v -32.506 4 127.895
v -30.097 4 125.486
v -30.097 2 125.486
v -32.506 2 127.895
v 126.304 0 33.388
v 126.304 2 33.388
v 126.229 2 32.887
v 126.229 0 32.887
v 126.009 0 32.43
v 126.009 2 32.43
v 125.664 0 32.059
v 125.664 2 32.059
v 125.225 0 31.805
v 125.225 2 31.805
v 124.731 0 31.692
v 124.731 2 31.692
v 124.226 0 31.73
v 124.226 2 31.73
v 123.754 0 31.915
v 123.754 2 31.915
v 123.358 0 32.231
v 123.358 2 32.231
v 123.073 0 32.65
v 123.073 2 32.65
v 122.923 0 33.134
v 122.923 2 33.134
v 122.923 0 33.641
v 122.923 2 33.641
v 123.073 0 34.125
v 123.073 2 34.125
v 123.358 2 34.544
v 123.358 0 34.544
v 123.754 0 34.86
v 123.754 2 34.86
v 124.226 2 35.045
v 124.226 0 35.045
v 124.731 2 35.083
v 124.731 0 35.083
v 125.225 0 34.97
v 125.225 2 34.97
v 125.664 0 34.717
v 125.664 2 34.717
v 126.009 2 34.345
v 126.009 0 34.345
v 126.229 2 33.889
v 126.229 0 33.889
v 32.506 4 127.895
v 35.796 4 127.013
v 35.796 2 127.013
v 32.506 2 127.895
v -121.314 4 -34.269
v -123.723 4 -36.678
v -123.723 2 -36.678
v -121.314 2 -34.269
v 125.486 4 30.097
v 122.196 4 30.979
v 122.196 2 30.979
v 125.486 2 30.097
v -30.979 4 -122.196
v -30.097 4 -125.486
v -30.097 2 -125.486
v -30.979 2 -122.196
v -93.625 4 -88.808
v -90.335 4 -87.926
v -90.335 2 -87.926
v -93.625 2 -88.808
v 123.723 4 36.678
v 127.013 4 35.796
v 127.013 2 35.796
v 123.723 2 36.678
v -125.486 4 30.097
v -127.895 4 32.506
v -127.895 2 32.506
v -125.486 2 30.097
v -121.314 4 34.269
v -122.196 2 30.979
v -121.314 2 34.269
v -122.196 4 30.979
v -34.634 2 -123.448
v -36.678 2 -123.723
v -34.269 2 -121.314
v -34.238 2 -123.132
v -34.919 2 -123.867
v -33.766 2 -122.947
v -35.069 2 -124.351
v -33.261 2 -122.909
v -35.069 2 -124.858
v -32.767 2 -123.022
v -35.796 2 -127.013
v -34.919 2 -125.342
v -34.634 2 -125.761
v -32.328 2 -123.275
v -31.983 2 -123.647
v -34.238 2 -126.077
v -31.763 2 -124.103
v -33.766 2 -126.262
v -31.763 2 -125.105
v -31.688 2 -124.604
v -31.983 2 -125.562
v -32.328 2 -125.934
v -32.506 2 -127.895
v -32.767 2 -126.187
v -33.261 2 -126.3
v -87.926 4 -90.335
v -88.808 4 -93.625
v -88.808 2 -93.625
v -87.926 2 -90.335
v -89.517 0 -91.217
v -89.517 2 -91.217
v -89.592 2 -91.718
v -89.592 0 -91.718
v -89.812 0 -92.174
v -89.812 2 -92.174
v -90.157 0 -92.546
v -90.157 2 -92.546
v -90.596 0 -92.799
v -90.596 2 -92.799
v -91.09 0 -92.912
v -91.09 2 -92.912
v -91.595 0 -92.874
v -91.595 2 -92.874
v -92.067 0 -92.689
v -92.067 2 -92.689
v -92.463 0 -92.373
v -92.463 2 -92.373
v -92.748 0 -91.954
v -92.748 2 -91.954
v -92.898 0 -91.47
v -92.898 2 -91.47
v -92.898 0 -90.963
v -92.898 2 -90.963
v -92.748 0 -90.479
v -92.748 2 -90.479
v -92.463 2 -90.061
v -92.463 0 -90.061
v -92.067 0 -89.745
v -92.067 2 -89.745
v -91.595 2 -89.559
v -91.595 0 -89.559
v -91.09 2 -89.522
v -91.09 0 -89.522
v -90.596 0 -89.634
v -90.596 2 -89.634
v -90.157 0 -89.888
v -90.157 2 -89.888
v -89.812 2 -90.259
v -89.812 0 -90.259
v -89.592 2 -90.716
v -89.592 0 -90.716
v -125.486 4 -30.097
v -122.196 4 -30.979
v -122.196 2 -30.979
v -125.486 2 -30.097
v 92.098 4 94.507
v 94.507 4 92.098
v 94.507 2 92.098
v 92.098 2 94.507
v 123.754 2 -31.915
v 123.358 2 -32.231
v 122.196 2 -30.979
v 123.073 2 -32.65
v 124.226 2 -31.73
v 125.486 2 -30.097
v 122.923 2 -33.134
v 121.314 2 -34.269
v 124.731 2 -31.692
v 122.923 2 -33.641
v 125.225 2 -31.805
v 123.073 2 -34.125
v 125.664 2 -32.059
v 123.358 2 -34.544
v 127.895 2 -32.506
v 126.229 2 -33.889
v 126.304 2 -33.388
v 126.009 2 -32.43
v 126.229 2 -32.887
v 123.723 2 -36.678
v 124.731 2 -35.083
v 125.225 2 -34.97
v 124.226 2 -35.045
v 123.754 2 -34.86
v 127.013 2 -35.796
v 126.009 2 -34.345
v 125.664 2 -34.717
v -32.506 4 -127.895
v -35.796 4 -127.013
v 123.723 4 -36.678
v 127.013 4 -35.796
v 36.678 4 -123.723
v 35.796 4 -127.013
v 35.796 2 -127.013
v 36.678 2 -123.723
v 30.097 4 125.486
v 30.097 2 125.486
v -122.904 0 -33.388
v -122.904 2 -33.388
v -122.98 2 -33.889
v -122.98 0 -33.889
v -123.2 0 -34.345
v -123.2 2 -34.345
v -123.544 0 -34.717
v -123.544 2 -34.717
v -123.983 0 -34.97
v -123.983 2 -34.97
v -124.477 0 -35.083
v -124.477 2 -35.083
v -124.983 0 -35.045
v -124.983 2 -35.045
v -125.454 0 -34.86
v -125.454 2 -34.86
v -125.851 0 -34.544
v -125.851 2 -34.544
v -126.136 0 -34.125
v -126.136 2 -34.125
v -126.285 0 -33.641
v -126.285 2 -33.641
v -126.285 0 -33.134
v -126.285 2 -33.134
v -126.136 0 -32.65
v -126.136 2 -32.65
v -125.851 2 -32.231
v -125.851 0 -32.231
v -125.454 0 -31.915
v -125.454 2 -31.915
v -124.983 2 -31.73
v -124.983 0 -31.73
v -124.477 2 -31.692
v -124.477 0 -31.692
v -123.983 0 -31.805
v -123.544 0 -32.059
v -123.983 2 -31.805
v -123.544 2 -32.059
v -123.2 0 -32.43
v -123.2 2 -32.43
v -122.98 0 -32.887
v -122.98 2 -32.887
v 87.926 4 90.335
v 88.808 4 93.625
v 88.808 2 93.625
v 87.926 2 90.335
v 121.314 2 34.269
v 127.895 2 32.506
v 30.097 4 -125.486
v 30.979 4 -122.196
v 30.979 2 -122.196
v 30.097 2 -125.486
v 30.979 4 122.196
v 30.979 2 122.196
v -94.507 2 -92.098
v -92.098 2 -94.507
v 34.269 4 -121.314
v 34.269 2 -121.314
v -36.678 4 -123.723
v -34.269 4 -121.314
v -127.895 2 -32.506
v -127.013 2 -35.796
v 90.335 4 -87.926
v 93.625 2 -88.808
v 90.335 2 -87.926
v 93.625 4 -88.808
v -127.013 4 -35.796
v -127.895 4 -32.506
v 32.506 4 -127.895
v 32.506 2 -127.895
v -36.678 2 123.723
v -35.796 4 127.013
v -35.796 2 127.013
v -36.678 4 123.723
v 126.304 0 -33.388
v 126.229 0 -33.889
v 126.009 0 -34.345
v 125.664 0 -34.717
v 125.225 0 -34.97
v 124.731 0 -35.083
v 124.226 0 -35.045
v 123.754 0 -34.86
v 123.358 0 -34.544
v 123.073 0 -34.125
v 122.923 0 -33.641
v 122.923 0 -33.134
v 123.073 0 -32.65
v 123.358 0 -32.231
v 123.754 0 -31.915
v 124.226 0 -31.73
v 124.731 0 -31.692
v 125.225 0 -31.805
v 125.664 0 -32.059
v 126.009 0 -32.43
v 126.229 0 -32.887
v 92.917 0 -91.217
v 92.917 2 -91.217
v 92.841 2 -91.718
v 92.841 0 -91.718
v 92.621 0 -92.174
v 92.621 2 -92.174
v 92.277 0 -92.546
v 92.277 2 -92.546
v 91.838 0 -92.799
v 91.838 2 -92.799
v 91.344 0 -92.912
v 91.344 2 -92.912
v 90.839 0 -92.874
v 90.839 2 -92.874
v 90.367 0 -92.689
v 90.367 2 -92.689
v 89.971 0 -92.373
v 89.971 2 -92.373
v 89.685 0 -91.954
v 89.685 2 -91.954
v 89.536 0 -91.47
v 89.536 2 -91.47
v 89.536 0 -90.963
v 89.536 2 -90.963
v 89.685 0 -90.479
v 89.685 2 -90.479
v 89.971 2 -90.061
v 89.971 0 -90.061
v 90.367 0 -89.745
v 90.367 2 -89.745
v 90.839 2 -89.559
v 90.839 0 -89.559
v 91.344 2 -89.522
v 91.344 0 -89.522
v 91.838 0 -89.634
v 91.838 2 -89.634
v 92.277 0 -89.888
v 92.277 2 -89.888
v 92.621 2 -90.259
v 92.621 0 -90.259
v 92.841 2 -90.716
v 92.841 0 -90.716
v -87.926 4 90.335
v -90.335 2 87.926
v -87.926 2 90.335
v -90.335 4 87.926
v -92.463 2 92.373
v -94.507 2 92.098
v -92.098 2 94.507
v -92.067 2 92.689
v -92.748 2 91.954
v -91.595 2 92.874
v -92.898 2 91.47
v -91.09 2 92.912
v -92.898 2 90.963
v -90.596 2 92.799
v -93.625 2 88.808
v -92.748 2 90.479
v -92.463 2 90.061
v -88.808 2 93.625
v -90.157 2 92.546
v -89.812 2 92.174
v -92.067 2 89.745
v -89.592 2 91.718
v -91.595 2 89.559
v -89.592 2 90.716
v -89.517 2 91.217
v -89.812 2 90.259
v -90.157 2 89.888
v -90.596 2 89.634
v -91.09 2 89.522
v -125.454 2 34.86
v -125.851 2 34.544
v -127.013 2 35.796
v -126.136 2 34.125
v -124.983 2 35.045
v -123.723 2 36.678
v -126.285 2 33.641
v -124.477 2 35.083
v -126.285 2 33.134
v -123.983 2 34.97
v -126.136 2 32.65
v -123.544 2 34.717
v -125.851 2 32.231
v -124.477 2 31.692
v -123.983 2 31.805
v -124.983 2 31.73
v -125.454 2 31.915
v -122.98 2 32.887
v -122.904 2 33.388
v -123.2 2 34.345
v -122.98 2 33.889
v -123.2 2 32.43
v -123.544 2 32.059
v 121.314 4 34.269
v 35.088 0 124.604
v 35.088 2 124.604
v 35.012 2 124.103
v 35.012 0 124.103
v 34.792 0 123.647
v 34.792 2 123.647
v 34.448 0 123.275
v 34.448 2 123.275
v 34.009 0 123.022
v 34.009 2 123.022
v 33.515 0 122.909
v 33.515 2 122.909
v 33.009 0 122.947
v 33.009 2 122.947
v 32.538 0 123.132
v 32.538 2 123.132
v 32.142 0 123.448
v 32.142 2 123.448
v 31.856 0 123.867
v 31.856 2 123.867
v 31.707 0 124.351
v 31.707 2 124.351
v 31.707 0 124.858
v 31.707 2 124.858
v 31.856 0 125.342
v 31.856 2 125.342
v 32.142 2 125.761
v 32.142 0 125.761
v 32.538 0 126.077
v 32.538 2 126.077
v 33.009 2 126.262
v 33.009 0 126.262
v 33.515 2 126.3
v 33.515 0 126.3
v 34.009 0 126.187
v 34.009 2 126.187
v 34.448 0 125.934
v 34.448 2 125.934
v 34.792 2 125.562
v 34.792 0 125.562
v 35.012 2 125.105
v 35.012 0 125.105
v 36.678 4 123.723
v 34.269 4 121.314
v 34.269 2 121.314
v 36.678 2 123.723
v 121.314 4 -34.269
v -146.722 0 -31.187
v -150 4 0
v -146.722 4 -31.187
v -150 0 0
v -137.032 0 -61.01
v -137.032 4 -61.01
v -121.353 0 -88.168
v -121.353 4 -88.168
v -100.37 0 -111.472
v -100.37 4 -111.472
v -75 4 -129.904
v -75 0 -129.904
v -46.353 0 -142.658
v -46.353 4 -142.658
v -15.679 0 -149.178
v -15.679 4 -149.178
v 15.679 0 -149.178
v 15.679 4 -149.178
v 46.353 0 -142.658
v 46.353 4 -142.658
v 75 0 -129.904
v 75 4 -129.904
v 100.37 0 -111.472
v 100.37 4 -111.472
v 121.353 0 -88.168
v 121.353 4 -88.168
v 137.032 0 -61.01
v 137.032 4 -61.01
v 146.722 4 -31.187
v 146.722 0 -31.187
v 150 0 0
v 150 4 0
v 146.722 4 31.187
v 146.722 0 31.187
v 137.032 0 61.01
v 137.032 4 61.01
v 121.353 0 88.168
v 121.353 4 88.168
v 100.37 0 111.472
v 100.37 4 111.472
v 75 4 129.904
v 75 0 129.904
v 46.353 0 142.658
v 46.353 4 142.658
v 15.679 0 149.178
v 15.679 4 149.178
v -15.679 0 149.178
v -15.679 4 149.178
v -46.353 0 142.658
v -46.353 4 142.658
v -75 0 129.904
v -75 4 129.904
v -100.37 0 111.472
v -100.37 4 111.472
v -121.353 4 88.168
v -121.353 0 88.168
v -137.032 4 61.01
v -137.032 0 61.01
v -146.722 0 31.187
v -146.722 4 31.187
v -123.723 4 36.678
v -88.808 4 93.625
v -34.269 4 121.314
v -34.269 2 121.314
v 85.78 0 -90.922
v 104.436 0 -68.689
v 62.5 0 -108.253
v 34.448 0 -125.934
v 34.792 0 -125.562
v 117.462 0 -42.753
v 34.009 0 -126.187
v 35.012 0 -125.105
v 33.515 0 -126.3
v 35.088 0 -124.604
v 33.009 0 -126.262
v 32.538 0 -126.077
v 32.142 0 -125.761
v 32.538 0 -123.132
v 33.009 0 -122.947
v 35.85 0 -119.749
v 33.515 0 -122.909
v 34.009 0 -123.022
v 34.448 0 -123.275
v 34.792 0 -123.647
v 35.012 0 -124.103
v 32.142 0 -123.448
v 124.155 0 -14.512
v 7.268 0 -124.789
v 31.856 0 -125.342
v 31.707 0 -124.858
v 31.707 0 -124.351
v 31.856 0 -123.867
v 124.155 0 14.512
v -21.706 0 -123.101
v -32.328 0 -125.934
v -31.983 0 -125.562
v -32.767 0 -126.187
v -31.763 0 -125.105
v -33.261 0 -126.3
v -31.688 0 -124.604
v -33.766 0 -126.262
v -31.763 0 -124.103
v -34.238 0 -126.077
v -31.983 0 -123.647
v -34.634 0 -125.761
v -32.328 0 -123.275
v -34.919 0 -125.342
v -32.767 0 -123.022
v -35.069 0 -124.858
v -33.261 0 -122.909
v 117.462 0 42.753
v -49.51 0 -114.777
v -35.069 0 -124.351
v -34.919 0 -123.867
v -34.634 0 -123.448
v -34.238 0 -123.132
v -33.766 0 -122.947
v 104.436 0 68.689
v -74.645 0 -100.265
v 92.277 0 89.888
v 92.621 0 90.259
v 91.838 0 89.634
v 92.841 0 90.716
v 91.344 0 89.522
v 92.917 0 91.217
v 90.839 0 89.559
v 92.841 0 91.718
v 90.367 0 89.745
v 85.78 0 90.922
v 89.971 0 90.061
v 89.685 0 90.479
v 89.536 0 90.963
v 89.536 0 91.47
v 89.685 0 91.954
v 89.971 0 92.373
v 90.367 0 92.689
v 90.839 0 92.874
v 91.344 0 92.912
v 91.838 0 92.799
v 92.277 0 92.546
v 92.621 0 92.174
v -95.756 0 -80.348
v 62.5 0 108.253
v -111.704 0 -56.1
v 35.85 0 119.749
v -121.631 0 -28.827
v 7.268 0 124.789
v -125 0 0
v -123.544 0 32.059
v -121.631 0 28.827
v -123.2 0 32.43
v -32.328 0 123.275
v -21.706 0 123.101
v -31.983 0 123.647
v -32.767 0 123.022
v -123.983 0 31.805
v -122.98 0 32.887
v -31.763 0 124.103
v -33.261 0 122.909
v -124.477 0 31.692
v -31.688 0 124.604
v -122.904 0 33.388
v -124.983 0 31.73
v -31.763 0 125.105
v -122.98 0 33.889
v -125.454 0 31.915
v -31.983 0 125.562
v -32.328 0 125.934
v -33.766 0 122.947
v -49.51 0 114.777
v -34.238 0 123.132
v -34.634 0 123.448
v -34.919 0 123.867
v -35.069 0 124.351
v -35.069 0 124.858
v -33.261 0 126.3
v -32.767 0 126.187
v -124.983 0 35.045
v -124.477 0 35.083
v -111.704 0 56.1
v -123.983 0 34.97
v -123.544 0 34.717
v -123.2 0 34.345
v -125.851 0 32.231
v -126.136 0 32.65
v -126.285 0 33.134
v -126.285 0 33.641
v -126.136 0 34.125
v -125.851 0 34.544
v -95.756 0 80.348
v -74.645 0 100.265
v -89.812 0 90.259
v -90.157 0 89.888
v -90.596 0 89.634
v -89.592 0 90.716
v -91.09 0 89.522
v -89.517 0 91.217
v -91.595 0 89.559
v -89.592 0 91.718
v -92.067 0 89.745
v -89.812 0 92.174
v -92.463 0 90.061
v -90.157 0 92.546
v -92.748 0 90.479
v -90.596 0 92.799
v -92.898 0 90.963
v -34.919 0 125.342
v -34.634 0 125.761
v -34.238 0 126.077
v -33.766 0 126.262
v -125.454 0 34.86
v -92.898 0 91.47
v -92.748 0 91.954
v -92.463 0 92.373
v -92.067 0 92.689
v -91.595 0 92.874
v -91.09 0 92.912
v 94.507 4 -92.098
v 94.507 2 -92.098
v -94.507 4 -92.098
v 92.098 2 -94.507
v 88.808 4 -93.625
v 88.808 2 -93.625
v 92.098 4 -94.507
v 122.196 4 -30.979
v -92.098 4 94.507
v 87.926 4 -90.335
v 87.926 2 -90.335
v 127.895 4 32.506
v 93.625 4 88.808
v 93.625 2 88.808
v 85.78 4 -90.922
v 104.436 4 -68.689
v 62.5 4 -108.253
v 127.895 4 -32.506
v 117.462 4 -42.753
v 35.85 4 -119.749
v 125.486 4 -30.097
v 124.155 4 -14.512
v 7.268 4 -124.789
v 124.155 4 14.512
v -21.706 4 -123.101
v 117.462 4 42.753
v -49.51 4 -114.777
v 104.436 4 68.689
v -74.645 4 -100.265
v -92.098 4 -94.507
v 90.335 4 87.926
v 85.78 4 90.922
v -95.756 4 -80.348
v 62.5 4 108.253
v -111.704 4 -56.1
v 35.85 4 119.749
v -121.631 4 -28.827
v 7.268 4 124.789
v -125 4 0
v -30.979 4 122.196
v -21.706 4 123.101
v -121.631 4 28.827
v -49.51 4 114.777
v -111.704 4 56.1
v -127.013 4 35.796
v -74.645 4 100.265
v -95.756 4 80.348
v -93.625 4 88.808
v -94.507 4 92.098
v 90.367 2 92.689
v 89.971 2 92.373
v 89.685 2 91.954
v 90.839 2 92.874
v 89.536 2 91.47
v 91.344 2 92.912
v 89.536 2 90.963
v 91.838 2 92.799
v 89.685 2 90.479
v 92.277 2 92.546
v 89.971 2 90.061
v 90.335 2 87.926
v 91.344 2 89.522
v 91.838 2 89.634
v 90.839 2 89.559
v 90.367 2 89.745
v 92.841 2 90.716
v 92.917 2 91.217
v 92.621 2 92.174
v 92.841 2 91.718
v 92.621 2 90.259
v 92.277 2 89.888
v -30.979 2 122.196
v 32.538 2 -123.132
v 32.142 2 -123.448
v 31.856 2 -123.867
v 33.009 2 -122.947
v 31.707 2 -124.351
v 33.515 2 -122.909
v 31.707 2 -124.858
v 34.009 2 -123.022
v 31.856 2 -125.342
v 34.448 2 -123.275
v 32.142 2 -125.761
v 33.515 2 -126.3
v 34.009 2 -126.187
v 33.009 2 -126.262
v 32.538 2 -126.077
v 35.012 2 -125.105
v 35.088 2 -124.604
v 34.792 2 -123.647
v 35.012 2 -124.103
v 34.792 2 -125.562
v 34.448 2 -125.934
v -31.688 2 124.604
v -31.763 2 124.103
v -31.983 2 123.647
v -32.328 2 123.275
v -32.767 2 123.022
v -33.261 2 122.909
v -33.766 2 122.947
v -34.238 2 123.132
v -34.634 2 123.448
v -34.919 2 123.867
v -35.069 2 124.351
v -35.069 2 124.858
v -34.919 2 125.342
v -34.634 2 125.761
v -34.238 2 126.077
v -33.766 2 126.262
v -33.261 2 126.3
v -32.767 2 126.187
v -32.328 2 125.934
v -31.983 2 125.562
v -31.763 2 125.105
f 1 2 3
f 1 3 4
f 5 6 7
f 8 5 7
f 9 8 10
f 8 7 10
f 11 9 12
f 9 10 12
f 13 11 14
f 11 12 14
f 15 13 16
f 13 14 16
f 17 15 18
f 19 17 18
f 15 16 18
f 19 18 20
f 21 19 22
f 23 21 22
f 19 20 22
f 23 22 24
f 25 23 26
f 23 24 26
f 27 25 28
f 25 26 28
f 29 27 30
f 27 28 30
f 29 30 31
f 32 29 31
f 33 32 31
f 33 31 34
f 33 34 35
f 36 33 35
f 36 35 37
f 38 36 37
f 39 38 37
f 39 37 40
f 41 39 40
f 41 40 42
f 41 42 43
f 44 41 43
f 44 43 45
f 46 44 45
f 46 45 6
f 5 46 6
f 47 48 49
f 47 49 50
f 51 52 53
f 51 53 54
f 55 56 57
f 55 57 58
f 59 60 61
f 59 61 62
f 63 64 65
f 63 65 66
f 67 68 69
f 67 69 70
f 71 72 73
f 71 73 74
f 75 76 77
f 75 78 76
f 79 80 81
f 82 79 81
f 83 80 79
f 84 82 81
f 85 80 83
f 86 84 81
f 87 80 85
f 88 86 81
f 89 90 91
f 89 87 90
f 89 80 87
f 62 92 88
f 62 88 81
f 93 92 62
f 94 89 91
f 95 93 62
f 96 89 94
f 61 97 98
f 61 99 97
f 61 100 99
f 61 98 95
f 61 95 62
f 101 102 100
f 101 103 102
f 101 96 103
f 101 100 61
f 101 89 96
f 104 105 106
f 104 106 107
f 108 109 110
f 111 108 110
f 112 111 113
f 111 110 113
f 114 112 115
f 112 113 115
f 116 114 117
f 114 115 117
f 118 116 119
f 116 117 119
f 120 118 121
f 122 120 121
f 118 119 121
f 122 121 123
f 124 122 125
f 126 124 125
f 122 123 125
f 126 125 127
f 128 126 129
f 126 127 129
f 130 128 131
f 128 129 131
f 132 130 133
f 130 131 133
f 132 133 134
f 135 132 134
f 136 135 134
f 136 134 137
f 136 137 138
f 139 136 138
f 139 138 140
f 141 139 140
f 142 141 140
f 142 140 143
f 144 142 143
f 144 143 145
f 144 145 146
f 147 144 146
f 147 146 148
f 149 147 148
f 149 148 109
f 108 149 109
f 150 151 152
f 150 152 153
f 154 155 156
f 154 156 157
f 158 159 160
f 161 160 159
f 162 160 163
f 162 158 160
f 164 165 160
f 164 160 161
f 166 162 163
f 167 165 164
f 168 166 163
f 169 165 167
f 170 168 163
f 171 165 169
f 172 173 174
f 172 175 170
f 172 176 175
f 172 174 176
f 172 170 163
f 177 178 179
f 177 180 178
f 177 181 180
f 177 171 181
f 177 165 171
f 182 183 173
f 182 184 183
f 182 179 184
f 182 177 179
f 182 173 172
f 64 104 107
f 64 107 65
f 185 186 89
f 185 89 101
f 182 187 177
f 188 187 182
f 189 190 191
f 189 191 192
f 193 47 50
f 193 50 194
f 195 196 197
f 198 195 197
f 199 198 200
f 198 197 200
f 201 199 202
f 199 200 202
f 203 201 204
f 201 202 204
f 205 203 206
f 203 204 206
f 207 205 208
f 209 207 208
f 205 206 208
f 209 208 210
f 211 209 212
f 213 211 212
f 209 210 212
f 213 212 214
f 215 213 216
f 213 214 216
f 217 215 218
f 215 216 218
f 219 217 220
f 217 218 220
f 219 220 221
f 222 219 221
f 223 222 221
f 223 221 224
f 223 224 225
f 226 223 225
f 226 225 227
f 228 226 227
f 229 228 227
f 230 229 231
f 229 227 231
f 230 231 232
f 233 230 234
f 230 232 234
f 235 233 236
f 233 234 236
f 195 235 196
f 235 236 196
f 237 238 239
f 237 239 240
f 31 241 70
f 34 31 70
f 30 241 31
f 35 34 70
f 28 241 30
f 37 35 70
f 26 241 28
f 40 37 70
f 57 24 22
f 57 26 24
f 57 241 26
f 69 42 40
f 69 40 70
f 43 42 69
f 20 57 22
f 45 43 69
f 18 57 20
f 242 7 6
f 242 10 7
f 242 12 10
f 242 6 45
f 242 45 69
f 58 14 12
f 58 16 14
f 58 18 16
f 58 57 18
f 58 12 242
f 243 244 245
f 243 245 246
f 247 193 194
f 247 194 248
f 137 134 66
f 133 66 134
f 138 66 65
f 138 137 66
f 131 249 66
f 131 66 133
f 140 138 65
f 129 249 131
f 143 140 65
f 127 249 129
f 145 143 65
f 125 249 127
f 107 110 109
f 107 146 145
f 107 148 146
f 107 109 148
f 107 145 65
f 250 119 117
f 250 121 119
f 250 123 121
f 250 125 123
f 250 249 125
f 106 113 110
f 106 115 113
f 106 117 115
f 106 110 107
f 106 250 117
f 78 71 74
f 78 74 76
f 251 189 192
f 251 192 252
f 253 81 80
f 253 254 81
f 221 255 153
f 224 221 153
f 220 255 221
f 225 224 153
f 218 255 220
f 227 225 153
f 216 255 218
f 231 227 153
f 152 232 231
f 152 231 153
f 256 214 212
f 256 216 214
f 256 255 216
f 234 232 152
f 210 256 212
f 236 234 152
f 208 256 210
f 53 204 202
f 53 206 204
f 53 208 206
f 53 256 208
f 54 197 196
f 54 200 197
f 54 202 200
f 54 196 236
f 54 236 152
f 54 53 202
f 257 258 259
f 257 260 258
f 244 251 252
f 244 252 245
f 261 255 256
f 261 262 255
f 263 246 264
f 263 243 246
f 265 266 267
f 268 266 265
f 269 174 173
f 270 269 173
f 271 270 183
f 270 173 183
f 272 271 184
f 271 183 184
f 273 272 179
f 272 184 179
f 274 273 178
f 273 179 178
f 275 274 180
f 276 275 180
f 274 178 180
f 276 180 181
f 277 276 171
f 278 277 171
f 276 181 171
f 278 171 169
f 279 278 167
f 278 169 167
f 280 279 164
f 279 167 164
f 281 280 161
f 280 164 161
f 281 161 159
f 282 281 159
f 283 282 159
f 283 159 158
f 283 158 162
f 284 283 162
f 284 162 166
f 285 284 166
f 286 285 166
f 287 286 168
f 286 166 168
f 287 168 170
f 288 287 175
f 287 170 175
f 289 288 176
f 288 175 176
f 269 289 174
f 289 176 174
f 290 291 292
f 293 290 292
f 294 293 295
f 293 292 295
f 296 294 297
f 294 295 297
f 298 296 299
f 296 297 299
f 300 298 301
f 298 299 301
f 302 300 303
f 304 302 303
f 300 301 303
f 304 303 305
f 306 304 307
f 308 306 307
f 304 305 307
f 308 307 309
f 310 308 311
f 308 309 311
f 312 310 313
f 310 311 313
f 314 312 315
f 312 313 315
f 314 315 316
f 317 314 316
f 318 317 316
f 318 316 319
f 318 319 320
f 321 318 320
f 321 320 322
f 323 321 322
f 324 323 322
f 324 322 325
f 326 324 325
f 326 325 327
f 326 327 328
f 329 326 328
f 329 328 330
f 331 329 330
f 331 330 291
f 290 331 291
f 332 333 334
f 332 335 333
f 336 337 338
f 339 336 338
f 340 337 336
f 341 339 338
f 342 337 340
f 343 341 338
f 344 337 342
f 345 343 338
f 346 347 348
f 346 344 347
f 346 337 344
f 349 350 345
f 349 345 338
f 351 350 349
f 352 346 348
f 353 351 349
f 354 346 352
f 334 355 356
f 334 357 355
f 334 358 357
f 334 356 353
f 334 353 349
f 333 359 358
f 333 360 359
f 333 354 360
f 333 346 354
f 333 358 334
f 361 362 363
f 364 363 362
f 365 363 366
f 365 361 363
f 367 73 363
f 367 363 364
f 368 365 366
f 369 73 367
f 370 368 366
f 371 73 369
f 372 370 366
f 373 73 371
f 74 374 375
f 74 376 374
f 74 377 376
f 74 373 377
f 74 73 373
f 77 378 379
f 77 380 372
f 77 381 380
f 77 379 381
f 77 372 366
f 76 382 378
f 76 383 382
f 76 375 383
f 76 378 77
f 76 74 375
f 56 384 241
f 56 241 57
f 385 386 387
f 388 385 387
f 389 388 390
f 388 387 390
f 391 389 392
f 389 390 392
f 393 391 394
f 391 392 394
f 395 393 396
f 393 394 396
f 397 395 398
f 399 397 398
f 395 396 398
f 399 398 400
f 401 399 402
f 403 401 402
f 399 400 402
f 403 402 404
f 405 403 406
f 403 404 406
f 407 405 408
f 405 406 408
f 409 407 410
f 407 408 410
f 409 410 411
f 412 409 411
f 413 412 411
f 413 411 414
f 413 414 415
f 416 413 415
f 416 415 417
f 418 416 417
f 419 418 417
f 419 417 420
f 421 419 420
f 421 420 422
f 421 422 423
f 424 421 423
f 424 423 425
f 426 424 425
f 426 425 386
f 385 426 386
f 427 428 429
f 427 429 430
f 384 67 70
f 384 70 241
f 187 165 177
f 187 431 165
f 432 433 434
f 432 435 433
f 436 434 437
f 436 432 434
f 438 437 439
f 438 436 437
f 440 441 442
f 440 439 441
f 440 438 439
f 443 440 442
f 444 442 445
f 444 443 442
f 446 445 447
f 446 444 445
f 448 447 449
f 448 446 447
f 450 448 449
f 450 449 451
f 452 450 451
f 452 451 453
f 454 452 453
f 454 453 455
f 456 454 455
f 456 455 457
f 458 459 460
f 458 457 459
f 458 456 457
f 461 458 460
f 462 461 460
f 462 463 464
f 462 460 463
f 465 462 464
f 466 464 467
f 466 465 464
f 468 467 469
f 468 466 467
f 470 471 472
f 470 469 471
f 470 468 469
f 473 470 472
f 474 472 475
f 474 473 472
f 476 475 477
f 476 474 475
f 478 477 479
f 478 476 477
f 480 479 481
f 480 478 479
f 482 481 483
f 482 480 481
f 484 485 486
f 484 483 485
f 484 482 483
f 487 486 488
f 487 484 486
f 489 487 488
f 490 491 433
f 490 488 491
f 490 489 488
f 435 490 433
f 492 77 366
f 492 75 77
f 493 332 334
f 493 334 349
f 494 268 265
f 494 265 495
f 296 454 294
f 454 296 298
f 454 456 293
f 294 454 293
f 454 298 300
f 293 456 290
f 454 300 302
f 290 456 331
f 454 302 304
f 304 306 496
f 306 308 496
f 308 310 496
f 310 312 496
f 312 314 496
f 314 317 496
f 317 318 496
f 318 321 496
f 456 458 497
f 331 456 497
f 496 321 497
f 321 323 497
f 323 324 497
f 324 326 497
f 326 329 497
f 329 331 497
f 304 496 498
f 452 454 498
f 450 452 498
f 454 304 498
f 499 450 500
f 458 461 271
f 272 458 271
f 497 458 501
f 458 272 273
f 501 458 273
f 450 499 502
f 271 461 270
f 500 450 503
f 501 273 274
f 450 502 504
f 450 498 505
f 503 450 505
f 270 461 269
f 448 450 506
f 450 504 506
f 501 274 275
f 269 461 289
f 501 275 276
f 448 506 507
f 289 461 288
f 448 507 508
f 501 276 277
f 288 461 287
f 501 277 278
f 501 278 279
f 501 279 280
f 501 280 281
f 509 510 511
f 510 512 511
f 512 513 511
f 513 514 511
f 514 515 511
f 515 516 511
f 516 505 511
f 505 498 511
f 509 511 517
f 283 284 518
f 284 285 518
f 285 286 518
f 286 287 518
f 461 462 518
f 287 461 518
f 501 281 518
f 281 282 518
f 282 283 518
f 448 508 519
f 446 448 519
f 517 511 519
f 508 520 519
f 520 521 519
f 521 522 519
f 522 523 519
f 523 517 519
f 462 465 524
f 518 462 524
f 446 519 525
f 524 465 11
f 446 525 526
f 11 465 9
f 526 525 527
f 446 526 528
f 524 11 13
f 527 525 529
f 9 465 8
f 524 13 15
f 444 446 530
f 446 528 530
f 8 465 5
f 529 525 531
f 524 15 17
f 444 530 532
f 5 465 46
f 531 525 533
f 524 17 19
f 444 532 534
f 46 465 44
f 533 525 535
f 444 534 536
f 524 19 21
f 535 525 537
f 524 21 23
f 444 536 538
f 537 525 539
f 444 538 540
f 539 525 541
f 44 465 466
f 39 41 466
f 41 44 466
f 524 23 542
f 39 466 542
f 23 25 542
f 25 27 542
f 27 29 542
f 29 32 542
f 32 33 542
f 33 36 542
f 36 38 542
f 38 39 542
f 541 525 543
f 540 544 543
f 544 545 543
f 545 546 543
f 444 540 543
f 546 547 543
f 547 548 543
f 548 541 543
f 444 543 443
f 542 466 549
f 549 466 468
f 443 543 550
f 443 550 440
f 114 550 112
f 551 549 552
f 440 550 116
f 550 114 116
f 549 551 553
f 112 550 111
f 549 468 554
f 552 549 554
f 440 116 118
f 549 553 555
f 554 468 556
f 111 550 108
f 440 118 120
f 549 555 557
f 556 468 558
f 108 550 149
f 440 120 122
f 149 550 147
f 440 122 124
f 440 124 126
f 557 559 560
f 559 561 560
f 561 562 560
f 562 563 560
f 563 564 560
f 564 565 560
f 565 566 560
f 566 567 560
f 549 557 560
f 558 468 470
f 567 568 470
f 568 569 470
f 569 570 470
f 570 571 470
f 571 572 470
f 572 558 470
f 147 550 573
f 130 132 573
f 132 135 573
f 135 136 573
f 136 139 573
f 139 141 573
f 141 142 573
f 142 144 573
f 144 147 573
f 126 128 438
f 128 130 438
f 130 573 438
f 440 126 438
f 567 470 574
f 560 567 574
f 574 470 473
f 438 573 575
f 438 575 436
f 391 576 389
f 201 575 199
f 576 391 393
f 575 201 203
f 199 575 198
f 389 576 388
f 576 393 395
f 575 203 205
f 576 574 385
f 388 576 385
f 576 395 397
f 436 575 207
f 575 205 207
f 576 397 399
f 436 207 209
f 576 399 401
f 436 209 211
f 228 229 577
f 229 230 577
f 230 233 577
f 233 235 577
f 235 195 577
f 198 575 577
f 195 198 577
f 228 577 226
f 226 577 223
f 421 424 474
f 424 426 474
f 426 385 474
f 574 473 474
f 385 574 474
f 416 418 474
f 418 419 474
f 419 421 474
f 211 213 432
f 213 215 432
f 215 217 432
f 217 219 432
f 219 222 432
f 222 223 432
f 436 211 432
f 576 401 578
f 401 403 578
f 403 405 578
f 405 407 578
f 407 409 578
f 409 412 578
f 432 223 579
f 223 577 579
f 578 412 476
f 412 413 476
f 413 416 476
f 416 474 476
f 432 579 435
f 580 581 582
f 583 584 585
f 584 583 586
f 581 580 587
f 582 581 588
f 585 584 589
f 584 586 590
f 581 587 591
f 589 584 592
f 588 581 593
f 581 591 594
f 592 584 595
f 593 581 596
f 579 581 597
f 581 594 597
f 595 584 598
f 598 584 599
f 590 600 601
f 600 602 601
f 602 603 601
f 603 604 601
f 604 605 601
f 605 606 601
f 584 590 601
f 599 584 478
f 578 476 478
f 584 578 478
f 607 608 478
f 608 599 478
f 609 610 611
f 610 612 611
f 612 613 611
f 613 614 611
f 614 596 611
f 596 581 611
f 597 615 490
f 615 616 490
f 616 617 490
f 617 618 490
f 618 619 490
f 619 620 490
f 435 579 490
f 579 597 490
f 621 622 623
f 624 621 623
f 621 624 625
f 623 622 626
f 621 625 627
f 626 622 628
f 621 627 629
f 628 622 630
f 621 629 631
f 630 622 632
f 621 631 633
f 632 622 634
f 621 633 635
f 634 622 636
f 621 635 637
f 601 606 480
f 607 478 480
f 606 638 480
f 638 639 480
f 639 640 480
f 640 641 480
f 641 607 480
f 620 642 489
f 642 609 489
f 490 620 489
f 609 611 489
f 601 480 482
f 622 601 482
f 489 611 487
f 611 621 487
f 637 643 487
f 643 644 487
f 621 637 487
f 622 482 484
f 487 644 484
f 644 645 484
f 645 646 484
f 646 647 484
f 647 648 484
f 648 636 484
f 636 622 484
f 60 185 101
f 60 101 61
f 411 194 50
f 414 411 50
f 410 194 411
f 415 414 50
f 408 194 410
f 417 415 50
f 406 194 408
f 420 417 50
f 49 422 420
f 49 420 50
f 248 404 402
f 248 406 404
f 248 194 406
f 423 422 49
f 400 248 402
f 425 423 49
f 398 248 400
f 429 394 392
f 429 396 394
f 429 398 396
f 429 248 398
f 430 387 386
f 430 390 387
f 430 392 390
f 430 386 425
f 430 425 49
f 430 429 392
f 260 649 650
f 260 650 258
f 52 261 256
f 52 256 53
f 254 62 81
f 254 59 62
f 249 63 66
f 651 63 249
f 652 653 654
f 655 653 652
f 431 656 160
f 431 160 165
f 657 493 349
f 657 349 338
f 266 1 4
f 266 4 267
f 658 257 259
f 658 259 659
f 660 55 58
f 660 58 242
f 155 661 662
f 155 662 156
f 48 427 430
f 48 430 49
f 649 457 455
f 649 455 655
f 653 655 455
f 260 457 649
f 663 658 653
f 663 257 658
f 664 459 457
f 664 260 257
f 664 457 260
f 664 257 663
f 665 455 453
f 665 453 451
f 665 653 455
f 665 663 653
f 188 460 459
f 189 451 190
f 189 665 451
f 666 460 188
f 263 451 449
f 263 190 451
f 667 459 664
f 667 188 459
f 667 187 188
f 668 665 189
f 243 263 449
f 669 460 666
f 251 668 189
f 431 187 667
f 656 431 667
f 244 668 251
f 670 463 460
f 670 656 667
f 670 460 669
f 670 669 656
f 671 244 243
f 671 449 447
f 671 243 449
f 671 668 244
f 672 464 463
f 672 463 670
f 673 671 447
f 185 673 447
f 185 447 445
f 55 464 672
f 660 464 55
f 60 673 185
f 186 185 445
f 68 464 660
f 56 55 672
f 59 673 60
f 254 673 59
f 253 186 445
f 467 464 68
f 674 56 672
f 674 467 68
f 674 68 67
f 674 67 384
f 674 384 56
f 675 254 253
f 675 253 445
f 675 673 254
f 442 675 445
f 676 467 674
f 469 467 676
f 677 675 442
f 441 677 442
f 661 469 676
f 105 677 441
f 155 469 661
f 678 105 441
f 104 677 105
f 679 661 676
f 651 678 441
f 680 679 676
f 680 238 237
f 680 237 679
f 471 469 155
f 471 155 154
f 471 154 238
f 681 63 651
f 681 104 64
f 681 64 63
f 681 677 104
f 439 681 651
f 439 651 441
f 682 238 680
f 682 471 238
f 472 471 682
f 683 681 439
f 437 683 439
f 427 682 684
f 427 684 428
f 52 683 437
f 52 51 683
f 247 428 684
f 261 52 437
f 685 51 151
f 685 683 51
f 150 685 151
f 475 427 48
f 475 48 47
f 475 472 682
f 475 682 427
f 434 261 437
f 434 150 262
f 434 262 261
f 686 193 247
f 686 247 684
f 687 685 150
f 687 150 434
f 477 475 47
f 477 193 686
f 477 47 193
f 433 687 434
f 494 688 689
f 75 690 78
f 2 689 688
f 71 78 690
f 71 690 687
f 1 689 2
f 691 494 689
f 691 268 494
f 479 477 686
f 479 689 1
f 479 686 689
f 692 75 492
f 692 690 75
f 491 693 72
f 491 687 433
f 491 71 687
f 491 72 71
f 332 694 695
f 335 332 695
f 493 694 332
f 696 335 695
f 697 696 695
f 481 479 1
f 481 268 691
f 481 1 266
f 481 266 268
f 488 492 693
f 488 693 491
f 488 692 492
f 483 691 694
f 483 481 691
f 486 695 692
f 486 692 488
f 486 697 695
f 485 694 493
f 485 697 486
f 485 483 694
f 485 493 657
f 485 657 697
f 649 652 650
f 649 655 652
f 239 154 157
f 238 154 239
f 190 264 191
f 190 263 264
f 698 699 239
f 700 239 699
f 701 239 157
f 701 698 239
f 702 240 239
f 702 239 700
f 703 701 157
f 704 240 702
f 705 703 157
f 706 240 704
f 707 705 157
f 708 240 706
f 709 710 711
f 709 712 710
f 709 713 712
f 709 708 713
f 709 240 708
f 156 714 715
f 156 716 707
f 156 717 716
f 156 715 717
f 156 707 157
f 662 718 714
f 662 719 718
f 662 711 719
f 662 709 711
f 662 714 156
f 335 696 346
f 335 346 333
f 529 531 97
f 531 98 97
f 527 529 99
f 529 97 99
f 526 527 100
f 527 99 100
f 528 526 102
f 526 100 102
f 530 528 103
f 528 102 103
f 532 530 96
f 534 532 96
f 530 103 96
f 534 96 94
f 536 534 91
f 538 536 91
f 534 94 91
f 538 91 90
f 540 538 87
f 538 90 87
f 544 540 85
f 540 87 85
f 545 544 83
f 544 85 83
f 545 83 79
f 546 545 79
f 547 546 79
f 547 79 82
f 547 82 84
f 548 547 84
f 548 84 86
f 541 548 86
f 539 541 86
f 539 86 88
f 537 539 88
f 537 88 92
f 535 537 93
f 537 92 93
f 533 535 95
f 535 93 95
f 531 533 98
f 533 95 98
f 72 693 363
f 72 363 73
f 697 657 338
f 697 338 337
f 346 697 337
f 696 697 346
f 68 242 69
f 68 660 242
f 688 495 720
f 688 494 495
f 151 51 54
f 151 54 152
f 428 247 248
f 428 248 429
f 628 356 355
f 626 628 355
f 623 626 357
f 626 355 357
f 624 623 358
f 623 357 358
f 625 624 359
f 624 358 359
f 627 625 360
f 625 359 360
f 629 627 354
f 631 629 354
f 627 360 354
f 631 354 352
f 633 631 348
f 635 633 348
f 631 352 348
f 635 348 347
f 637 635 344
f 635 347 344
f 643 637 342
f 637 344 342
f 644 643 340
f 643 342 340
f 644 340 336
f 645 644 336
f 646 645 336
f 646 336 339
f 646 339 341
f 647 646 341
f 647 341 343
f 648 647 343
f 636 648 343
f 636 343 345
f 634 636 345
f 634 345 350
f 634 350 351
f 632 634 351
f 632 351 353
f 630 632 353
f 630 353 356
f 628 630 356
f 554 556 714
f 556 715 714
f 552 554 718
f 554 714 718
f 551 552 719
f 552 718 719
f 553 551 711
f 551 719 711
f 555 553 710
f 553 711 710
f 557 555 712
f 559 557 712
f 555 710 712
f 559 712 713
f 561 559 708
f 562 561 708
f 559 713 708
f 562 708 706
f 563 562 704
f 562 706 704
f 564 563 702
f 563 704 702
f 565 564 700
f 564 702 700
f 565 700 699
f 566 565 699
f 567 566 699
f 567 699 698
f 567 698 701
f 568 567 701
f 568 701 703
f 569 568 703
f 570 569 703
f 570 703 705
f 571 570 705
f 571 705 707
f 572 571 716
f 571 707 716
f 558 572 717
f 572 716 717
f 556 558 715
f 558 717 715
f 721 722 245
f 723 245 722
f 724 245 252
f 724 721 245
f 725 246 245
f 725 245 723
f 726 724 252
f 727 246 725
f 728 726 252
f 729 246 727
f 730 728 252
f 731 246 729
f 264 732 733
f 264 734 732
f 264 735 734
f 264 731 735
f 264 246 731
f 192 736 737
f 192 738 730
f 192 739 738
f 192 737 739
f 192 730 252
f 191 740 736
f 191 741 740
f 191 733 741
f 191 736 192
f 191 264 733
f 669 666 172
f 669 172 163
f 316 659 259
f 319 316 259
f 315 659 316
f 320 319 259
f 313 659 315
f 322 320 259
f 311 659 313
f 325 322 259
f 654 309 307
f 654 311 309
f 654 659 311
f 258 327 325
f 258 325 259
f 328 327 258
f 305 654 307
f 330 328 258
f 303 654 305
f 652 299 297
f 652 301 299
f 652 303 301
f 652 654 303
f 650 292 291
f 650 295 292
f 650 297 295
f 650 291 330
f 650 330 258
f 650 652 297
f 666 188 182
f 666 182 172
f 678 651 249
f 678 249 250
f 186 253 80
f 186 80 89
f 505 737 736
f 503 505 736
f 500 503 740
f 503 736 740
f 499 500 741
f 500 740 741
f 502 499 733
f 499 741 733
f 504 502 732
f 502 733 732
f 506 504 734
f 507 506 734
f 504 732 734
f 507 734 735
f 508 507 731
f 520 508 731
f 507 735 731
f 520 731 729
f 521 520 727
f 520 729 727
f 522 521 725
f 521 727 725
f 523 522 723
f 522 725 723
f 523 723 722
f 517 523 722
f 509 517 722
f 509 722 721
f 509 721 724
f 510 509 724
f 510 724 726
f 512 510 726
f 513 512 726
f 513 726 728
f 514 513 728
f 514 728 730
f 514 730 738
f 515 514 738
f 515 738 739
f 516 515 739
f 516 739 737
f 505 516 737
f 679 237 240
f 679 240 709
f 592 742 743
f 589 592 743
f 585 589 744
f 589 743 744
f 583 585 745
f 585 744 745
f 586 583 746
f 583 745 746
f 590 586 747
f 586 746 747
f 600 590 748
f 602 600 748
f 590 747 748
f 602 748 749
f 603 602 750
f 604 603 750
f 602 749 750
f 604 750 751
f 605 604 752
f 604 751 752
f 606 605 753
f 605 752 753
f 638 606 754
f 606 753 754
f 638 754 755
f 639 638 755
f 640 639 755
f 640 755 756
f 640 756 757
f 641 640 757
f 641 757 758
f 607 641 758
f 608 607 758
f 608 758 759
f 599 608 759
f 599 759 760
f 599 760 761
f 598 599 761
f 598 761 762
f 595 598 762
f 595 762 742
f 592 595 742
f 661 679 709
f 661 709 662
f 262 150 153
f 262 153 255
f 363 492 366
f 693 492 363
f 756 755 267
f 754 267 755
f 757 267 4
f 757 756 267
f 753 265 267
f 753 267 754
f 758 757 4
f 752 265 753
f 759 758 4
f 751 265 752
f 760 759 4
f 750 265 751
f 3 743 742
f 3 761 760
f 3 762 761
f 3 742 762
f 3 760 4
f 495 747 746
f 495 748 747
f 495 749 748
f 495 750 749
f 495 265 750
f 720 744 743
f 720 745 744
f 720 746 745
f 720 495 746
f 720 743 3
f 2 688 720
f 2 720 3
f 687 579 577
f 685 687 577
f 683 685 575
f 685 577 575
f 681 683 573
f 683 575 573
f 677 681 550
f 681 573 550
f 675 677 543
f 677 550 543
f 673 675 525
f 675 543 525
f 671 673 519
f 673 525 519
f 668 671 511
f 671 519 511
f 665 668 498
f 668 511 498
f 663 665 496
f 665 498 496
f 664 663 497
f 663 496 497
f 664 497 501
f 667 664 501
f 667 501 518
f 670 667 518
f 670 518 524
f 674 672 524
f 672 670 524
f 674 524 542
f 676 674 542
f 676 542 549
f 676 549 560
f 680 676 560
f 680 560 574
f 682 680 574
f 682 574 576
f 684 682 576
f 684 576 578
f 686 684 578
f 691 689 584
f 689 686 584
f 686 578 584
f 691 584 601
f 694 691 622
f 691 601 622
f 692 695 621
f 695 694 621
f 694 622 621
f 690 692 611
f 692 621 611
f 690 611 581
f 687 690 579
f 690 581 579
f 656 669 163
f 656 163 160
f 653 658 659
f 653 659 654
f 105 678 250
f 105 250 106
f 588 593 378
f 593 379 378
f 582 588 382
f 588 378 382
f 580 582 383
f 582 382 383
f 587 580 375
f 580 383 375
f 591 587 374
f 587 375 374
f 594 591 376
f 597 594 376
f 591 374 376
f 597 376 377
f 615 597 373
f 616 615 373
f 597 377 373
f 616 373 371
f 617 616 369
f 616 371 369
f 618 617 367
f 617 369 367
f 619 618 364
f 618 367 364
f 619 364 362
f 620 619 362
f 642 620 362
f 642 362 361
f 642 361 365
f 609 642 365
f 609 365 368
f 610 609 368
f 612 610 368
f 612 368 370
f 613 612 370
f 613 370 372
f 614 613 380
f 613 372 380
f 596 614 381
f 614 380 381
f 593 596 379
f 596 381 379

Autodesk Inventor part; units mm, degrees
ref_plane "YZ Plane" through (0, 0, 0) normal (1, 0, 0) x (0, 1, 0)
ref_plane "XZ Plane" through (0, 0, 0) normal (0, 1, 0) x (-1, 0, 0)
ref_plane "XY Plane" through (0, 0, 0) normal (0, 0, 1) x (1, 0, 0)
sketch "Sketch1" plane through (0, 0, 0) normal (0, 1, 0) x (-1, 0, 0)
  circle A0 centre (0, 0) radius 150
  circle A1 centre (0, 0) radius 125
  dimension "d0" = 300
  dimension "d1" = 250
extrude "Extrusion1" add sketch "Sketch1" along normal blind 4
sketch "Sketch2" plane through (0, 4, 0) normal (0, 1, 0) x (1, 0, 0)
  line L0 (0, 0) -> (124.6044, 33.3877) construction
  line L1 (125.4861, 30.0974) -> (122.1958, 30.979)
  line L2 (122.1958, 30.979) -> (121.3141, 34.2693)
  line L3 (121.3141, 34.2693) -> (123.7228, 36.678)
  line L4 (123.7228, 36.678) -> (127.0131, 35.7963)
  line L5 (127.0131, 35.7963) -> (127.8947, 32.506)
  line L6 (127.8947, 32.506) -> (125.4861, 30.0974)
  line L7 (0, 0) -> (150, 0) construction
  circle A0 centre (0, 0) radius 150 projected
  line L8 (87.9265, 90.3351) -> (88.8081, 93.6254)
  line L9 (90.3351, 87.9265) -> (87.9265, 90.3351)
  line L10 (93.6254, 88.8081) -> (90.3351, 87.9265)
  line L11 (94.5071, 92.0984) -> (93.6254, 88.8081)
  line L12 (92.0984, 94.5071) -> (94.5071, 92.0984)
  line L13 (88.8081, 93.6254) -> (92.0984, 94.5071)
  line L14 (30.979, 122.1958) -> (30.0974, 125.4861)
  line L15 (34.2693, 121.3141) -> (30.979, 122.1958)
  line L16 (36.678, 123.7228) -> (34.2693, 121.3141)
  line L17 (35.7963, 127.0131) -> (36.678, 123.7228)
  line L18 (32.506, 127.8947) -> (35.7963, 127.0131)
  line L19 (30.0974, 125.4861) -> (32.506, 127.8947)
  line L20 (-34.2693, 121.3141) -> (-36.678, 123.7228)
  line L21 (-30.979, 122.1958) -> (-34.2693, 121.3141)
  line L22 (-30.0974, 125.4861) -> (-30.979, 122.1958)
  line L23 (-32.506, 127.8947) -> (-30.0974, 125.4861)
  line L24 (-35.7963, 127.0131) -> (-32.506, 127.8947)
  line L25 (-36.678, 123.7228) -> (-35.7963, 127.0131)
  line L26 (-90.3351, 87.9265) -> (-93.6254, 88.8081)
  line L27 (-87.9265, 90.3351) -> (-90.3351, 87.9265)
  line L28 (-88.8081, 93.6254) -> (-87.9265, 90.3351)
  line L29 (-92.0984, 94.5071) -> (-88.8081, 93.6254)
  line L30 (-94.5071, 92.0984) -> (-92.0984, 94.5071)
  line L31 (-93.6254, 88.8081) -> (-94.5071, 92.0984)
  line L32 (-122.1958, 30.979) -> (-125.4861, 30.0974)
  line L33 (-121.3141, 34.2693) -> (-122.1958, 30.979)
  line L34 (-123.7228, 36.678) -> (-121.3141, 34.2693)
  line L35 (-127.0131, 35.7963) -> (-123.7228, 36.678)
  line L36 (-127.8947, 32.506) -> (-127.0131, 35.7963)
  line L37 (-125.4861, 30.0974) -> (-127.8947, 32.506)
  line L38 (-121.3141, -34.2693) -> (-123.7228, -36.678)
  line L39 (-122.1958, -30.979) -> (-121.3141, -34.2693)
  line L40 (-125.4861, -30.0974) -> (-122.1958, -30.979)
  line L41 (-127.8947, -32.506) -> (-125.4861, -30.0974)
  line L42 (-127.0131, -35.7963) -> (-127.8947, -32.506)
  line L43 (-123.7228, -36.678) -> (-127.0131, -35.7963)
  line L44 (-87.9265, -90.3351) -> (-88.8081, -93.6254)
  line L45 (-90.3351, -87.9265) -> (-87.9265, -90.3351)
  line L46 (-93.6254, -88.8081) -> (-90.3351, -87.9265)
  line L47 (-94.5071, -92.0984) -> (-93.6254, -88.8081)
  line L48 (-92.0984, -94.5071) -> (-94.5071, -92.0984)
  line L49 (-88.8081, -93.6254) -> (-92.0984, -94.5071)
  line L50 (-30.979, -122.1958) -> (-30.0974, -125.4861)
  line L51 (-34.2693, -121.3141) -> (-30.979, -122.1958)
  line L52 (-36.678, -123.7228) -> (-34.2693, -121.3141)
  line L53 (-35.7963, -127.0131) -> (-36.678, -123.7228)
  line L54 (-32.506, -127.8947) -> (-35.7963, -127.0131)
  line L55 (-30.0974, -125.4861) -> (-32.506, -127.8947)
  line L56 (34.2693, -121.3141) -> (36.678, -123.7228)
  line L57 (30.979, -122.1958) -> (34.2693, -121.3141)
  line L58 (30.0974, -125.4861) -> (30.979, -122.1958)
  line L59 (32.506, -127.8947) -> (30.0974, -125.4861)
  line L60 (35.7963, -127.0131) -> (32.506, -127.8947)
  line L61 (36.678, -123.7228) -> (35.7963, -127.0131)
  line L62 (90.3351, -87.9265) -> (93.6254, -88.8081)
  line L63 (87.9265, -90.3351) -> (90.3351, -87.9265)
  line L64 (88.8081, -93.6254) -> (87.9265, -90.3351)
  line L65 (92.0984, -94.5071) -> (88.8081, -93.6254)
  line L66 (94.5071, -92.0984) -> (92.0984, -94.5071)
  line L67 (93.6254, -88.8081) -> (94.5071, -92.0984)
  line L68 (122.1958, -30.979) -> (125.4861, -30.0974)
  line L69 (121.3141, -34.2693) -> (122.1958, -30.979)
  line L70 (123.7228, -36.678) -> (121.3141, -34.2693)
  line L71 (127.0131, -35.7963) -> (123.7228, -36.678)
  line L72 (127.8947, -32.506) -> (127.0131, -35.7963)
  line L73 (125.4861, -30.0974) -> (127.8947, -32.506)
  dimension "d4" = 5.9
  dimension "d5" = 15
  dimension "d6" = 129
  dimension "d9" = 360
extrude "Extrusion2" cut sketch "Sketch2" against normal blind 2 contours L1 L2 L3 L4 L5 L6 | L8 L13 L12 L11 L10 L9 | L14 L19 L18 L17 L16 L15 | L20 L25 L24 L23 L22 L21 | L26 L31 L30 L29 L28 L27 | L32 L37 L36 L35 L34 L33 | L38 L43 L42 L41 L40 L39 | L44 L49 L48 L47 L46 L45 | L50 L55 L54 L53 L52 L51 | L56 L61 L60 L59 L58 L57 | L62 L67 L66 L65 L64 L63 | L68 L73 L72 L71 L70 L69
sketch "Sketch3" plane through (0, 2, 0) normal (0, 1, 0) x (1, 0, 0)
  line L0 (121.3141, 34.2693) -> (123.7228, 36.678) projected
  line L1 (125.4861, 30.0974) -> (122.1958, 30.979) projected
  line L2 (123.7228, 36.678) -> (125.4861, 30.0974) construction
  circle A0 centre (124.6044, 33.3877) radius 1.7
  circle A1 centre (91.2168, 91.2168) radius 1.7
  circle A2 centre (33.3877, 124.6044) radius 1.7
  circle A3 centre (-33.3877, 124.6044) radius 1.7
  circle A4 centre (-91.2168, 91.2168) radius 1.7
  circle A5 centre (-124.6044, 33.3877) radius 1.7
  circle A6 centre (-124.6044, -33.3877) radius 1.7
  circle A7 centre (-91.2168, -91.2168) radius 1.7
  circle A8 centre (-33.3877, -124.6044) radius 1.7
  circle A9 centre (33.3877, -124.6044) radius 1.7
  circle A10 centre (91.2168, -91.2168) radius 1.7
  circle A11 centre (124.6044, -33.3877) radius 1.7
  point P0 (0, 0)
  dimension "d13" = 3.4
  dimension "d16" = 360
extrude "Extrusion3" cut sketch "Sketch3" against normal through all
properties part number "ArmLoopInnerRing"
